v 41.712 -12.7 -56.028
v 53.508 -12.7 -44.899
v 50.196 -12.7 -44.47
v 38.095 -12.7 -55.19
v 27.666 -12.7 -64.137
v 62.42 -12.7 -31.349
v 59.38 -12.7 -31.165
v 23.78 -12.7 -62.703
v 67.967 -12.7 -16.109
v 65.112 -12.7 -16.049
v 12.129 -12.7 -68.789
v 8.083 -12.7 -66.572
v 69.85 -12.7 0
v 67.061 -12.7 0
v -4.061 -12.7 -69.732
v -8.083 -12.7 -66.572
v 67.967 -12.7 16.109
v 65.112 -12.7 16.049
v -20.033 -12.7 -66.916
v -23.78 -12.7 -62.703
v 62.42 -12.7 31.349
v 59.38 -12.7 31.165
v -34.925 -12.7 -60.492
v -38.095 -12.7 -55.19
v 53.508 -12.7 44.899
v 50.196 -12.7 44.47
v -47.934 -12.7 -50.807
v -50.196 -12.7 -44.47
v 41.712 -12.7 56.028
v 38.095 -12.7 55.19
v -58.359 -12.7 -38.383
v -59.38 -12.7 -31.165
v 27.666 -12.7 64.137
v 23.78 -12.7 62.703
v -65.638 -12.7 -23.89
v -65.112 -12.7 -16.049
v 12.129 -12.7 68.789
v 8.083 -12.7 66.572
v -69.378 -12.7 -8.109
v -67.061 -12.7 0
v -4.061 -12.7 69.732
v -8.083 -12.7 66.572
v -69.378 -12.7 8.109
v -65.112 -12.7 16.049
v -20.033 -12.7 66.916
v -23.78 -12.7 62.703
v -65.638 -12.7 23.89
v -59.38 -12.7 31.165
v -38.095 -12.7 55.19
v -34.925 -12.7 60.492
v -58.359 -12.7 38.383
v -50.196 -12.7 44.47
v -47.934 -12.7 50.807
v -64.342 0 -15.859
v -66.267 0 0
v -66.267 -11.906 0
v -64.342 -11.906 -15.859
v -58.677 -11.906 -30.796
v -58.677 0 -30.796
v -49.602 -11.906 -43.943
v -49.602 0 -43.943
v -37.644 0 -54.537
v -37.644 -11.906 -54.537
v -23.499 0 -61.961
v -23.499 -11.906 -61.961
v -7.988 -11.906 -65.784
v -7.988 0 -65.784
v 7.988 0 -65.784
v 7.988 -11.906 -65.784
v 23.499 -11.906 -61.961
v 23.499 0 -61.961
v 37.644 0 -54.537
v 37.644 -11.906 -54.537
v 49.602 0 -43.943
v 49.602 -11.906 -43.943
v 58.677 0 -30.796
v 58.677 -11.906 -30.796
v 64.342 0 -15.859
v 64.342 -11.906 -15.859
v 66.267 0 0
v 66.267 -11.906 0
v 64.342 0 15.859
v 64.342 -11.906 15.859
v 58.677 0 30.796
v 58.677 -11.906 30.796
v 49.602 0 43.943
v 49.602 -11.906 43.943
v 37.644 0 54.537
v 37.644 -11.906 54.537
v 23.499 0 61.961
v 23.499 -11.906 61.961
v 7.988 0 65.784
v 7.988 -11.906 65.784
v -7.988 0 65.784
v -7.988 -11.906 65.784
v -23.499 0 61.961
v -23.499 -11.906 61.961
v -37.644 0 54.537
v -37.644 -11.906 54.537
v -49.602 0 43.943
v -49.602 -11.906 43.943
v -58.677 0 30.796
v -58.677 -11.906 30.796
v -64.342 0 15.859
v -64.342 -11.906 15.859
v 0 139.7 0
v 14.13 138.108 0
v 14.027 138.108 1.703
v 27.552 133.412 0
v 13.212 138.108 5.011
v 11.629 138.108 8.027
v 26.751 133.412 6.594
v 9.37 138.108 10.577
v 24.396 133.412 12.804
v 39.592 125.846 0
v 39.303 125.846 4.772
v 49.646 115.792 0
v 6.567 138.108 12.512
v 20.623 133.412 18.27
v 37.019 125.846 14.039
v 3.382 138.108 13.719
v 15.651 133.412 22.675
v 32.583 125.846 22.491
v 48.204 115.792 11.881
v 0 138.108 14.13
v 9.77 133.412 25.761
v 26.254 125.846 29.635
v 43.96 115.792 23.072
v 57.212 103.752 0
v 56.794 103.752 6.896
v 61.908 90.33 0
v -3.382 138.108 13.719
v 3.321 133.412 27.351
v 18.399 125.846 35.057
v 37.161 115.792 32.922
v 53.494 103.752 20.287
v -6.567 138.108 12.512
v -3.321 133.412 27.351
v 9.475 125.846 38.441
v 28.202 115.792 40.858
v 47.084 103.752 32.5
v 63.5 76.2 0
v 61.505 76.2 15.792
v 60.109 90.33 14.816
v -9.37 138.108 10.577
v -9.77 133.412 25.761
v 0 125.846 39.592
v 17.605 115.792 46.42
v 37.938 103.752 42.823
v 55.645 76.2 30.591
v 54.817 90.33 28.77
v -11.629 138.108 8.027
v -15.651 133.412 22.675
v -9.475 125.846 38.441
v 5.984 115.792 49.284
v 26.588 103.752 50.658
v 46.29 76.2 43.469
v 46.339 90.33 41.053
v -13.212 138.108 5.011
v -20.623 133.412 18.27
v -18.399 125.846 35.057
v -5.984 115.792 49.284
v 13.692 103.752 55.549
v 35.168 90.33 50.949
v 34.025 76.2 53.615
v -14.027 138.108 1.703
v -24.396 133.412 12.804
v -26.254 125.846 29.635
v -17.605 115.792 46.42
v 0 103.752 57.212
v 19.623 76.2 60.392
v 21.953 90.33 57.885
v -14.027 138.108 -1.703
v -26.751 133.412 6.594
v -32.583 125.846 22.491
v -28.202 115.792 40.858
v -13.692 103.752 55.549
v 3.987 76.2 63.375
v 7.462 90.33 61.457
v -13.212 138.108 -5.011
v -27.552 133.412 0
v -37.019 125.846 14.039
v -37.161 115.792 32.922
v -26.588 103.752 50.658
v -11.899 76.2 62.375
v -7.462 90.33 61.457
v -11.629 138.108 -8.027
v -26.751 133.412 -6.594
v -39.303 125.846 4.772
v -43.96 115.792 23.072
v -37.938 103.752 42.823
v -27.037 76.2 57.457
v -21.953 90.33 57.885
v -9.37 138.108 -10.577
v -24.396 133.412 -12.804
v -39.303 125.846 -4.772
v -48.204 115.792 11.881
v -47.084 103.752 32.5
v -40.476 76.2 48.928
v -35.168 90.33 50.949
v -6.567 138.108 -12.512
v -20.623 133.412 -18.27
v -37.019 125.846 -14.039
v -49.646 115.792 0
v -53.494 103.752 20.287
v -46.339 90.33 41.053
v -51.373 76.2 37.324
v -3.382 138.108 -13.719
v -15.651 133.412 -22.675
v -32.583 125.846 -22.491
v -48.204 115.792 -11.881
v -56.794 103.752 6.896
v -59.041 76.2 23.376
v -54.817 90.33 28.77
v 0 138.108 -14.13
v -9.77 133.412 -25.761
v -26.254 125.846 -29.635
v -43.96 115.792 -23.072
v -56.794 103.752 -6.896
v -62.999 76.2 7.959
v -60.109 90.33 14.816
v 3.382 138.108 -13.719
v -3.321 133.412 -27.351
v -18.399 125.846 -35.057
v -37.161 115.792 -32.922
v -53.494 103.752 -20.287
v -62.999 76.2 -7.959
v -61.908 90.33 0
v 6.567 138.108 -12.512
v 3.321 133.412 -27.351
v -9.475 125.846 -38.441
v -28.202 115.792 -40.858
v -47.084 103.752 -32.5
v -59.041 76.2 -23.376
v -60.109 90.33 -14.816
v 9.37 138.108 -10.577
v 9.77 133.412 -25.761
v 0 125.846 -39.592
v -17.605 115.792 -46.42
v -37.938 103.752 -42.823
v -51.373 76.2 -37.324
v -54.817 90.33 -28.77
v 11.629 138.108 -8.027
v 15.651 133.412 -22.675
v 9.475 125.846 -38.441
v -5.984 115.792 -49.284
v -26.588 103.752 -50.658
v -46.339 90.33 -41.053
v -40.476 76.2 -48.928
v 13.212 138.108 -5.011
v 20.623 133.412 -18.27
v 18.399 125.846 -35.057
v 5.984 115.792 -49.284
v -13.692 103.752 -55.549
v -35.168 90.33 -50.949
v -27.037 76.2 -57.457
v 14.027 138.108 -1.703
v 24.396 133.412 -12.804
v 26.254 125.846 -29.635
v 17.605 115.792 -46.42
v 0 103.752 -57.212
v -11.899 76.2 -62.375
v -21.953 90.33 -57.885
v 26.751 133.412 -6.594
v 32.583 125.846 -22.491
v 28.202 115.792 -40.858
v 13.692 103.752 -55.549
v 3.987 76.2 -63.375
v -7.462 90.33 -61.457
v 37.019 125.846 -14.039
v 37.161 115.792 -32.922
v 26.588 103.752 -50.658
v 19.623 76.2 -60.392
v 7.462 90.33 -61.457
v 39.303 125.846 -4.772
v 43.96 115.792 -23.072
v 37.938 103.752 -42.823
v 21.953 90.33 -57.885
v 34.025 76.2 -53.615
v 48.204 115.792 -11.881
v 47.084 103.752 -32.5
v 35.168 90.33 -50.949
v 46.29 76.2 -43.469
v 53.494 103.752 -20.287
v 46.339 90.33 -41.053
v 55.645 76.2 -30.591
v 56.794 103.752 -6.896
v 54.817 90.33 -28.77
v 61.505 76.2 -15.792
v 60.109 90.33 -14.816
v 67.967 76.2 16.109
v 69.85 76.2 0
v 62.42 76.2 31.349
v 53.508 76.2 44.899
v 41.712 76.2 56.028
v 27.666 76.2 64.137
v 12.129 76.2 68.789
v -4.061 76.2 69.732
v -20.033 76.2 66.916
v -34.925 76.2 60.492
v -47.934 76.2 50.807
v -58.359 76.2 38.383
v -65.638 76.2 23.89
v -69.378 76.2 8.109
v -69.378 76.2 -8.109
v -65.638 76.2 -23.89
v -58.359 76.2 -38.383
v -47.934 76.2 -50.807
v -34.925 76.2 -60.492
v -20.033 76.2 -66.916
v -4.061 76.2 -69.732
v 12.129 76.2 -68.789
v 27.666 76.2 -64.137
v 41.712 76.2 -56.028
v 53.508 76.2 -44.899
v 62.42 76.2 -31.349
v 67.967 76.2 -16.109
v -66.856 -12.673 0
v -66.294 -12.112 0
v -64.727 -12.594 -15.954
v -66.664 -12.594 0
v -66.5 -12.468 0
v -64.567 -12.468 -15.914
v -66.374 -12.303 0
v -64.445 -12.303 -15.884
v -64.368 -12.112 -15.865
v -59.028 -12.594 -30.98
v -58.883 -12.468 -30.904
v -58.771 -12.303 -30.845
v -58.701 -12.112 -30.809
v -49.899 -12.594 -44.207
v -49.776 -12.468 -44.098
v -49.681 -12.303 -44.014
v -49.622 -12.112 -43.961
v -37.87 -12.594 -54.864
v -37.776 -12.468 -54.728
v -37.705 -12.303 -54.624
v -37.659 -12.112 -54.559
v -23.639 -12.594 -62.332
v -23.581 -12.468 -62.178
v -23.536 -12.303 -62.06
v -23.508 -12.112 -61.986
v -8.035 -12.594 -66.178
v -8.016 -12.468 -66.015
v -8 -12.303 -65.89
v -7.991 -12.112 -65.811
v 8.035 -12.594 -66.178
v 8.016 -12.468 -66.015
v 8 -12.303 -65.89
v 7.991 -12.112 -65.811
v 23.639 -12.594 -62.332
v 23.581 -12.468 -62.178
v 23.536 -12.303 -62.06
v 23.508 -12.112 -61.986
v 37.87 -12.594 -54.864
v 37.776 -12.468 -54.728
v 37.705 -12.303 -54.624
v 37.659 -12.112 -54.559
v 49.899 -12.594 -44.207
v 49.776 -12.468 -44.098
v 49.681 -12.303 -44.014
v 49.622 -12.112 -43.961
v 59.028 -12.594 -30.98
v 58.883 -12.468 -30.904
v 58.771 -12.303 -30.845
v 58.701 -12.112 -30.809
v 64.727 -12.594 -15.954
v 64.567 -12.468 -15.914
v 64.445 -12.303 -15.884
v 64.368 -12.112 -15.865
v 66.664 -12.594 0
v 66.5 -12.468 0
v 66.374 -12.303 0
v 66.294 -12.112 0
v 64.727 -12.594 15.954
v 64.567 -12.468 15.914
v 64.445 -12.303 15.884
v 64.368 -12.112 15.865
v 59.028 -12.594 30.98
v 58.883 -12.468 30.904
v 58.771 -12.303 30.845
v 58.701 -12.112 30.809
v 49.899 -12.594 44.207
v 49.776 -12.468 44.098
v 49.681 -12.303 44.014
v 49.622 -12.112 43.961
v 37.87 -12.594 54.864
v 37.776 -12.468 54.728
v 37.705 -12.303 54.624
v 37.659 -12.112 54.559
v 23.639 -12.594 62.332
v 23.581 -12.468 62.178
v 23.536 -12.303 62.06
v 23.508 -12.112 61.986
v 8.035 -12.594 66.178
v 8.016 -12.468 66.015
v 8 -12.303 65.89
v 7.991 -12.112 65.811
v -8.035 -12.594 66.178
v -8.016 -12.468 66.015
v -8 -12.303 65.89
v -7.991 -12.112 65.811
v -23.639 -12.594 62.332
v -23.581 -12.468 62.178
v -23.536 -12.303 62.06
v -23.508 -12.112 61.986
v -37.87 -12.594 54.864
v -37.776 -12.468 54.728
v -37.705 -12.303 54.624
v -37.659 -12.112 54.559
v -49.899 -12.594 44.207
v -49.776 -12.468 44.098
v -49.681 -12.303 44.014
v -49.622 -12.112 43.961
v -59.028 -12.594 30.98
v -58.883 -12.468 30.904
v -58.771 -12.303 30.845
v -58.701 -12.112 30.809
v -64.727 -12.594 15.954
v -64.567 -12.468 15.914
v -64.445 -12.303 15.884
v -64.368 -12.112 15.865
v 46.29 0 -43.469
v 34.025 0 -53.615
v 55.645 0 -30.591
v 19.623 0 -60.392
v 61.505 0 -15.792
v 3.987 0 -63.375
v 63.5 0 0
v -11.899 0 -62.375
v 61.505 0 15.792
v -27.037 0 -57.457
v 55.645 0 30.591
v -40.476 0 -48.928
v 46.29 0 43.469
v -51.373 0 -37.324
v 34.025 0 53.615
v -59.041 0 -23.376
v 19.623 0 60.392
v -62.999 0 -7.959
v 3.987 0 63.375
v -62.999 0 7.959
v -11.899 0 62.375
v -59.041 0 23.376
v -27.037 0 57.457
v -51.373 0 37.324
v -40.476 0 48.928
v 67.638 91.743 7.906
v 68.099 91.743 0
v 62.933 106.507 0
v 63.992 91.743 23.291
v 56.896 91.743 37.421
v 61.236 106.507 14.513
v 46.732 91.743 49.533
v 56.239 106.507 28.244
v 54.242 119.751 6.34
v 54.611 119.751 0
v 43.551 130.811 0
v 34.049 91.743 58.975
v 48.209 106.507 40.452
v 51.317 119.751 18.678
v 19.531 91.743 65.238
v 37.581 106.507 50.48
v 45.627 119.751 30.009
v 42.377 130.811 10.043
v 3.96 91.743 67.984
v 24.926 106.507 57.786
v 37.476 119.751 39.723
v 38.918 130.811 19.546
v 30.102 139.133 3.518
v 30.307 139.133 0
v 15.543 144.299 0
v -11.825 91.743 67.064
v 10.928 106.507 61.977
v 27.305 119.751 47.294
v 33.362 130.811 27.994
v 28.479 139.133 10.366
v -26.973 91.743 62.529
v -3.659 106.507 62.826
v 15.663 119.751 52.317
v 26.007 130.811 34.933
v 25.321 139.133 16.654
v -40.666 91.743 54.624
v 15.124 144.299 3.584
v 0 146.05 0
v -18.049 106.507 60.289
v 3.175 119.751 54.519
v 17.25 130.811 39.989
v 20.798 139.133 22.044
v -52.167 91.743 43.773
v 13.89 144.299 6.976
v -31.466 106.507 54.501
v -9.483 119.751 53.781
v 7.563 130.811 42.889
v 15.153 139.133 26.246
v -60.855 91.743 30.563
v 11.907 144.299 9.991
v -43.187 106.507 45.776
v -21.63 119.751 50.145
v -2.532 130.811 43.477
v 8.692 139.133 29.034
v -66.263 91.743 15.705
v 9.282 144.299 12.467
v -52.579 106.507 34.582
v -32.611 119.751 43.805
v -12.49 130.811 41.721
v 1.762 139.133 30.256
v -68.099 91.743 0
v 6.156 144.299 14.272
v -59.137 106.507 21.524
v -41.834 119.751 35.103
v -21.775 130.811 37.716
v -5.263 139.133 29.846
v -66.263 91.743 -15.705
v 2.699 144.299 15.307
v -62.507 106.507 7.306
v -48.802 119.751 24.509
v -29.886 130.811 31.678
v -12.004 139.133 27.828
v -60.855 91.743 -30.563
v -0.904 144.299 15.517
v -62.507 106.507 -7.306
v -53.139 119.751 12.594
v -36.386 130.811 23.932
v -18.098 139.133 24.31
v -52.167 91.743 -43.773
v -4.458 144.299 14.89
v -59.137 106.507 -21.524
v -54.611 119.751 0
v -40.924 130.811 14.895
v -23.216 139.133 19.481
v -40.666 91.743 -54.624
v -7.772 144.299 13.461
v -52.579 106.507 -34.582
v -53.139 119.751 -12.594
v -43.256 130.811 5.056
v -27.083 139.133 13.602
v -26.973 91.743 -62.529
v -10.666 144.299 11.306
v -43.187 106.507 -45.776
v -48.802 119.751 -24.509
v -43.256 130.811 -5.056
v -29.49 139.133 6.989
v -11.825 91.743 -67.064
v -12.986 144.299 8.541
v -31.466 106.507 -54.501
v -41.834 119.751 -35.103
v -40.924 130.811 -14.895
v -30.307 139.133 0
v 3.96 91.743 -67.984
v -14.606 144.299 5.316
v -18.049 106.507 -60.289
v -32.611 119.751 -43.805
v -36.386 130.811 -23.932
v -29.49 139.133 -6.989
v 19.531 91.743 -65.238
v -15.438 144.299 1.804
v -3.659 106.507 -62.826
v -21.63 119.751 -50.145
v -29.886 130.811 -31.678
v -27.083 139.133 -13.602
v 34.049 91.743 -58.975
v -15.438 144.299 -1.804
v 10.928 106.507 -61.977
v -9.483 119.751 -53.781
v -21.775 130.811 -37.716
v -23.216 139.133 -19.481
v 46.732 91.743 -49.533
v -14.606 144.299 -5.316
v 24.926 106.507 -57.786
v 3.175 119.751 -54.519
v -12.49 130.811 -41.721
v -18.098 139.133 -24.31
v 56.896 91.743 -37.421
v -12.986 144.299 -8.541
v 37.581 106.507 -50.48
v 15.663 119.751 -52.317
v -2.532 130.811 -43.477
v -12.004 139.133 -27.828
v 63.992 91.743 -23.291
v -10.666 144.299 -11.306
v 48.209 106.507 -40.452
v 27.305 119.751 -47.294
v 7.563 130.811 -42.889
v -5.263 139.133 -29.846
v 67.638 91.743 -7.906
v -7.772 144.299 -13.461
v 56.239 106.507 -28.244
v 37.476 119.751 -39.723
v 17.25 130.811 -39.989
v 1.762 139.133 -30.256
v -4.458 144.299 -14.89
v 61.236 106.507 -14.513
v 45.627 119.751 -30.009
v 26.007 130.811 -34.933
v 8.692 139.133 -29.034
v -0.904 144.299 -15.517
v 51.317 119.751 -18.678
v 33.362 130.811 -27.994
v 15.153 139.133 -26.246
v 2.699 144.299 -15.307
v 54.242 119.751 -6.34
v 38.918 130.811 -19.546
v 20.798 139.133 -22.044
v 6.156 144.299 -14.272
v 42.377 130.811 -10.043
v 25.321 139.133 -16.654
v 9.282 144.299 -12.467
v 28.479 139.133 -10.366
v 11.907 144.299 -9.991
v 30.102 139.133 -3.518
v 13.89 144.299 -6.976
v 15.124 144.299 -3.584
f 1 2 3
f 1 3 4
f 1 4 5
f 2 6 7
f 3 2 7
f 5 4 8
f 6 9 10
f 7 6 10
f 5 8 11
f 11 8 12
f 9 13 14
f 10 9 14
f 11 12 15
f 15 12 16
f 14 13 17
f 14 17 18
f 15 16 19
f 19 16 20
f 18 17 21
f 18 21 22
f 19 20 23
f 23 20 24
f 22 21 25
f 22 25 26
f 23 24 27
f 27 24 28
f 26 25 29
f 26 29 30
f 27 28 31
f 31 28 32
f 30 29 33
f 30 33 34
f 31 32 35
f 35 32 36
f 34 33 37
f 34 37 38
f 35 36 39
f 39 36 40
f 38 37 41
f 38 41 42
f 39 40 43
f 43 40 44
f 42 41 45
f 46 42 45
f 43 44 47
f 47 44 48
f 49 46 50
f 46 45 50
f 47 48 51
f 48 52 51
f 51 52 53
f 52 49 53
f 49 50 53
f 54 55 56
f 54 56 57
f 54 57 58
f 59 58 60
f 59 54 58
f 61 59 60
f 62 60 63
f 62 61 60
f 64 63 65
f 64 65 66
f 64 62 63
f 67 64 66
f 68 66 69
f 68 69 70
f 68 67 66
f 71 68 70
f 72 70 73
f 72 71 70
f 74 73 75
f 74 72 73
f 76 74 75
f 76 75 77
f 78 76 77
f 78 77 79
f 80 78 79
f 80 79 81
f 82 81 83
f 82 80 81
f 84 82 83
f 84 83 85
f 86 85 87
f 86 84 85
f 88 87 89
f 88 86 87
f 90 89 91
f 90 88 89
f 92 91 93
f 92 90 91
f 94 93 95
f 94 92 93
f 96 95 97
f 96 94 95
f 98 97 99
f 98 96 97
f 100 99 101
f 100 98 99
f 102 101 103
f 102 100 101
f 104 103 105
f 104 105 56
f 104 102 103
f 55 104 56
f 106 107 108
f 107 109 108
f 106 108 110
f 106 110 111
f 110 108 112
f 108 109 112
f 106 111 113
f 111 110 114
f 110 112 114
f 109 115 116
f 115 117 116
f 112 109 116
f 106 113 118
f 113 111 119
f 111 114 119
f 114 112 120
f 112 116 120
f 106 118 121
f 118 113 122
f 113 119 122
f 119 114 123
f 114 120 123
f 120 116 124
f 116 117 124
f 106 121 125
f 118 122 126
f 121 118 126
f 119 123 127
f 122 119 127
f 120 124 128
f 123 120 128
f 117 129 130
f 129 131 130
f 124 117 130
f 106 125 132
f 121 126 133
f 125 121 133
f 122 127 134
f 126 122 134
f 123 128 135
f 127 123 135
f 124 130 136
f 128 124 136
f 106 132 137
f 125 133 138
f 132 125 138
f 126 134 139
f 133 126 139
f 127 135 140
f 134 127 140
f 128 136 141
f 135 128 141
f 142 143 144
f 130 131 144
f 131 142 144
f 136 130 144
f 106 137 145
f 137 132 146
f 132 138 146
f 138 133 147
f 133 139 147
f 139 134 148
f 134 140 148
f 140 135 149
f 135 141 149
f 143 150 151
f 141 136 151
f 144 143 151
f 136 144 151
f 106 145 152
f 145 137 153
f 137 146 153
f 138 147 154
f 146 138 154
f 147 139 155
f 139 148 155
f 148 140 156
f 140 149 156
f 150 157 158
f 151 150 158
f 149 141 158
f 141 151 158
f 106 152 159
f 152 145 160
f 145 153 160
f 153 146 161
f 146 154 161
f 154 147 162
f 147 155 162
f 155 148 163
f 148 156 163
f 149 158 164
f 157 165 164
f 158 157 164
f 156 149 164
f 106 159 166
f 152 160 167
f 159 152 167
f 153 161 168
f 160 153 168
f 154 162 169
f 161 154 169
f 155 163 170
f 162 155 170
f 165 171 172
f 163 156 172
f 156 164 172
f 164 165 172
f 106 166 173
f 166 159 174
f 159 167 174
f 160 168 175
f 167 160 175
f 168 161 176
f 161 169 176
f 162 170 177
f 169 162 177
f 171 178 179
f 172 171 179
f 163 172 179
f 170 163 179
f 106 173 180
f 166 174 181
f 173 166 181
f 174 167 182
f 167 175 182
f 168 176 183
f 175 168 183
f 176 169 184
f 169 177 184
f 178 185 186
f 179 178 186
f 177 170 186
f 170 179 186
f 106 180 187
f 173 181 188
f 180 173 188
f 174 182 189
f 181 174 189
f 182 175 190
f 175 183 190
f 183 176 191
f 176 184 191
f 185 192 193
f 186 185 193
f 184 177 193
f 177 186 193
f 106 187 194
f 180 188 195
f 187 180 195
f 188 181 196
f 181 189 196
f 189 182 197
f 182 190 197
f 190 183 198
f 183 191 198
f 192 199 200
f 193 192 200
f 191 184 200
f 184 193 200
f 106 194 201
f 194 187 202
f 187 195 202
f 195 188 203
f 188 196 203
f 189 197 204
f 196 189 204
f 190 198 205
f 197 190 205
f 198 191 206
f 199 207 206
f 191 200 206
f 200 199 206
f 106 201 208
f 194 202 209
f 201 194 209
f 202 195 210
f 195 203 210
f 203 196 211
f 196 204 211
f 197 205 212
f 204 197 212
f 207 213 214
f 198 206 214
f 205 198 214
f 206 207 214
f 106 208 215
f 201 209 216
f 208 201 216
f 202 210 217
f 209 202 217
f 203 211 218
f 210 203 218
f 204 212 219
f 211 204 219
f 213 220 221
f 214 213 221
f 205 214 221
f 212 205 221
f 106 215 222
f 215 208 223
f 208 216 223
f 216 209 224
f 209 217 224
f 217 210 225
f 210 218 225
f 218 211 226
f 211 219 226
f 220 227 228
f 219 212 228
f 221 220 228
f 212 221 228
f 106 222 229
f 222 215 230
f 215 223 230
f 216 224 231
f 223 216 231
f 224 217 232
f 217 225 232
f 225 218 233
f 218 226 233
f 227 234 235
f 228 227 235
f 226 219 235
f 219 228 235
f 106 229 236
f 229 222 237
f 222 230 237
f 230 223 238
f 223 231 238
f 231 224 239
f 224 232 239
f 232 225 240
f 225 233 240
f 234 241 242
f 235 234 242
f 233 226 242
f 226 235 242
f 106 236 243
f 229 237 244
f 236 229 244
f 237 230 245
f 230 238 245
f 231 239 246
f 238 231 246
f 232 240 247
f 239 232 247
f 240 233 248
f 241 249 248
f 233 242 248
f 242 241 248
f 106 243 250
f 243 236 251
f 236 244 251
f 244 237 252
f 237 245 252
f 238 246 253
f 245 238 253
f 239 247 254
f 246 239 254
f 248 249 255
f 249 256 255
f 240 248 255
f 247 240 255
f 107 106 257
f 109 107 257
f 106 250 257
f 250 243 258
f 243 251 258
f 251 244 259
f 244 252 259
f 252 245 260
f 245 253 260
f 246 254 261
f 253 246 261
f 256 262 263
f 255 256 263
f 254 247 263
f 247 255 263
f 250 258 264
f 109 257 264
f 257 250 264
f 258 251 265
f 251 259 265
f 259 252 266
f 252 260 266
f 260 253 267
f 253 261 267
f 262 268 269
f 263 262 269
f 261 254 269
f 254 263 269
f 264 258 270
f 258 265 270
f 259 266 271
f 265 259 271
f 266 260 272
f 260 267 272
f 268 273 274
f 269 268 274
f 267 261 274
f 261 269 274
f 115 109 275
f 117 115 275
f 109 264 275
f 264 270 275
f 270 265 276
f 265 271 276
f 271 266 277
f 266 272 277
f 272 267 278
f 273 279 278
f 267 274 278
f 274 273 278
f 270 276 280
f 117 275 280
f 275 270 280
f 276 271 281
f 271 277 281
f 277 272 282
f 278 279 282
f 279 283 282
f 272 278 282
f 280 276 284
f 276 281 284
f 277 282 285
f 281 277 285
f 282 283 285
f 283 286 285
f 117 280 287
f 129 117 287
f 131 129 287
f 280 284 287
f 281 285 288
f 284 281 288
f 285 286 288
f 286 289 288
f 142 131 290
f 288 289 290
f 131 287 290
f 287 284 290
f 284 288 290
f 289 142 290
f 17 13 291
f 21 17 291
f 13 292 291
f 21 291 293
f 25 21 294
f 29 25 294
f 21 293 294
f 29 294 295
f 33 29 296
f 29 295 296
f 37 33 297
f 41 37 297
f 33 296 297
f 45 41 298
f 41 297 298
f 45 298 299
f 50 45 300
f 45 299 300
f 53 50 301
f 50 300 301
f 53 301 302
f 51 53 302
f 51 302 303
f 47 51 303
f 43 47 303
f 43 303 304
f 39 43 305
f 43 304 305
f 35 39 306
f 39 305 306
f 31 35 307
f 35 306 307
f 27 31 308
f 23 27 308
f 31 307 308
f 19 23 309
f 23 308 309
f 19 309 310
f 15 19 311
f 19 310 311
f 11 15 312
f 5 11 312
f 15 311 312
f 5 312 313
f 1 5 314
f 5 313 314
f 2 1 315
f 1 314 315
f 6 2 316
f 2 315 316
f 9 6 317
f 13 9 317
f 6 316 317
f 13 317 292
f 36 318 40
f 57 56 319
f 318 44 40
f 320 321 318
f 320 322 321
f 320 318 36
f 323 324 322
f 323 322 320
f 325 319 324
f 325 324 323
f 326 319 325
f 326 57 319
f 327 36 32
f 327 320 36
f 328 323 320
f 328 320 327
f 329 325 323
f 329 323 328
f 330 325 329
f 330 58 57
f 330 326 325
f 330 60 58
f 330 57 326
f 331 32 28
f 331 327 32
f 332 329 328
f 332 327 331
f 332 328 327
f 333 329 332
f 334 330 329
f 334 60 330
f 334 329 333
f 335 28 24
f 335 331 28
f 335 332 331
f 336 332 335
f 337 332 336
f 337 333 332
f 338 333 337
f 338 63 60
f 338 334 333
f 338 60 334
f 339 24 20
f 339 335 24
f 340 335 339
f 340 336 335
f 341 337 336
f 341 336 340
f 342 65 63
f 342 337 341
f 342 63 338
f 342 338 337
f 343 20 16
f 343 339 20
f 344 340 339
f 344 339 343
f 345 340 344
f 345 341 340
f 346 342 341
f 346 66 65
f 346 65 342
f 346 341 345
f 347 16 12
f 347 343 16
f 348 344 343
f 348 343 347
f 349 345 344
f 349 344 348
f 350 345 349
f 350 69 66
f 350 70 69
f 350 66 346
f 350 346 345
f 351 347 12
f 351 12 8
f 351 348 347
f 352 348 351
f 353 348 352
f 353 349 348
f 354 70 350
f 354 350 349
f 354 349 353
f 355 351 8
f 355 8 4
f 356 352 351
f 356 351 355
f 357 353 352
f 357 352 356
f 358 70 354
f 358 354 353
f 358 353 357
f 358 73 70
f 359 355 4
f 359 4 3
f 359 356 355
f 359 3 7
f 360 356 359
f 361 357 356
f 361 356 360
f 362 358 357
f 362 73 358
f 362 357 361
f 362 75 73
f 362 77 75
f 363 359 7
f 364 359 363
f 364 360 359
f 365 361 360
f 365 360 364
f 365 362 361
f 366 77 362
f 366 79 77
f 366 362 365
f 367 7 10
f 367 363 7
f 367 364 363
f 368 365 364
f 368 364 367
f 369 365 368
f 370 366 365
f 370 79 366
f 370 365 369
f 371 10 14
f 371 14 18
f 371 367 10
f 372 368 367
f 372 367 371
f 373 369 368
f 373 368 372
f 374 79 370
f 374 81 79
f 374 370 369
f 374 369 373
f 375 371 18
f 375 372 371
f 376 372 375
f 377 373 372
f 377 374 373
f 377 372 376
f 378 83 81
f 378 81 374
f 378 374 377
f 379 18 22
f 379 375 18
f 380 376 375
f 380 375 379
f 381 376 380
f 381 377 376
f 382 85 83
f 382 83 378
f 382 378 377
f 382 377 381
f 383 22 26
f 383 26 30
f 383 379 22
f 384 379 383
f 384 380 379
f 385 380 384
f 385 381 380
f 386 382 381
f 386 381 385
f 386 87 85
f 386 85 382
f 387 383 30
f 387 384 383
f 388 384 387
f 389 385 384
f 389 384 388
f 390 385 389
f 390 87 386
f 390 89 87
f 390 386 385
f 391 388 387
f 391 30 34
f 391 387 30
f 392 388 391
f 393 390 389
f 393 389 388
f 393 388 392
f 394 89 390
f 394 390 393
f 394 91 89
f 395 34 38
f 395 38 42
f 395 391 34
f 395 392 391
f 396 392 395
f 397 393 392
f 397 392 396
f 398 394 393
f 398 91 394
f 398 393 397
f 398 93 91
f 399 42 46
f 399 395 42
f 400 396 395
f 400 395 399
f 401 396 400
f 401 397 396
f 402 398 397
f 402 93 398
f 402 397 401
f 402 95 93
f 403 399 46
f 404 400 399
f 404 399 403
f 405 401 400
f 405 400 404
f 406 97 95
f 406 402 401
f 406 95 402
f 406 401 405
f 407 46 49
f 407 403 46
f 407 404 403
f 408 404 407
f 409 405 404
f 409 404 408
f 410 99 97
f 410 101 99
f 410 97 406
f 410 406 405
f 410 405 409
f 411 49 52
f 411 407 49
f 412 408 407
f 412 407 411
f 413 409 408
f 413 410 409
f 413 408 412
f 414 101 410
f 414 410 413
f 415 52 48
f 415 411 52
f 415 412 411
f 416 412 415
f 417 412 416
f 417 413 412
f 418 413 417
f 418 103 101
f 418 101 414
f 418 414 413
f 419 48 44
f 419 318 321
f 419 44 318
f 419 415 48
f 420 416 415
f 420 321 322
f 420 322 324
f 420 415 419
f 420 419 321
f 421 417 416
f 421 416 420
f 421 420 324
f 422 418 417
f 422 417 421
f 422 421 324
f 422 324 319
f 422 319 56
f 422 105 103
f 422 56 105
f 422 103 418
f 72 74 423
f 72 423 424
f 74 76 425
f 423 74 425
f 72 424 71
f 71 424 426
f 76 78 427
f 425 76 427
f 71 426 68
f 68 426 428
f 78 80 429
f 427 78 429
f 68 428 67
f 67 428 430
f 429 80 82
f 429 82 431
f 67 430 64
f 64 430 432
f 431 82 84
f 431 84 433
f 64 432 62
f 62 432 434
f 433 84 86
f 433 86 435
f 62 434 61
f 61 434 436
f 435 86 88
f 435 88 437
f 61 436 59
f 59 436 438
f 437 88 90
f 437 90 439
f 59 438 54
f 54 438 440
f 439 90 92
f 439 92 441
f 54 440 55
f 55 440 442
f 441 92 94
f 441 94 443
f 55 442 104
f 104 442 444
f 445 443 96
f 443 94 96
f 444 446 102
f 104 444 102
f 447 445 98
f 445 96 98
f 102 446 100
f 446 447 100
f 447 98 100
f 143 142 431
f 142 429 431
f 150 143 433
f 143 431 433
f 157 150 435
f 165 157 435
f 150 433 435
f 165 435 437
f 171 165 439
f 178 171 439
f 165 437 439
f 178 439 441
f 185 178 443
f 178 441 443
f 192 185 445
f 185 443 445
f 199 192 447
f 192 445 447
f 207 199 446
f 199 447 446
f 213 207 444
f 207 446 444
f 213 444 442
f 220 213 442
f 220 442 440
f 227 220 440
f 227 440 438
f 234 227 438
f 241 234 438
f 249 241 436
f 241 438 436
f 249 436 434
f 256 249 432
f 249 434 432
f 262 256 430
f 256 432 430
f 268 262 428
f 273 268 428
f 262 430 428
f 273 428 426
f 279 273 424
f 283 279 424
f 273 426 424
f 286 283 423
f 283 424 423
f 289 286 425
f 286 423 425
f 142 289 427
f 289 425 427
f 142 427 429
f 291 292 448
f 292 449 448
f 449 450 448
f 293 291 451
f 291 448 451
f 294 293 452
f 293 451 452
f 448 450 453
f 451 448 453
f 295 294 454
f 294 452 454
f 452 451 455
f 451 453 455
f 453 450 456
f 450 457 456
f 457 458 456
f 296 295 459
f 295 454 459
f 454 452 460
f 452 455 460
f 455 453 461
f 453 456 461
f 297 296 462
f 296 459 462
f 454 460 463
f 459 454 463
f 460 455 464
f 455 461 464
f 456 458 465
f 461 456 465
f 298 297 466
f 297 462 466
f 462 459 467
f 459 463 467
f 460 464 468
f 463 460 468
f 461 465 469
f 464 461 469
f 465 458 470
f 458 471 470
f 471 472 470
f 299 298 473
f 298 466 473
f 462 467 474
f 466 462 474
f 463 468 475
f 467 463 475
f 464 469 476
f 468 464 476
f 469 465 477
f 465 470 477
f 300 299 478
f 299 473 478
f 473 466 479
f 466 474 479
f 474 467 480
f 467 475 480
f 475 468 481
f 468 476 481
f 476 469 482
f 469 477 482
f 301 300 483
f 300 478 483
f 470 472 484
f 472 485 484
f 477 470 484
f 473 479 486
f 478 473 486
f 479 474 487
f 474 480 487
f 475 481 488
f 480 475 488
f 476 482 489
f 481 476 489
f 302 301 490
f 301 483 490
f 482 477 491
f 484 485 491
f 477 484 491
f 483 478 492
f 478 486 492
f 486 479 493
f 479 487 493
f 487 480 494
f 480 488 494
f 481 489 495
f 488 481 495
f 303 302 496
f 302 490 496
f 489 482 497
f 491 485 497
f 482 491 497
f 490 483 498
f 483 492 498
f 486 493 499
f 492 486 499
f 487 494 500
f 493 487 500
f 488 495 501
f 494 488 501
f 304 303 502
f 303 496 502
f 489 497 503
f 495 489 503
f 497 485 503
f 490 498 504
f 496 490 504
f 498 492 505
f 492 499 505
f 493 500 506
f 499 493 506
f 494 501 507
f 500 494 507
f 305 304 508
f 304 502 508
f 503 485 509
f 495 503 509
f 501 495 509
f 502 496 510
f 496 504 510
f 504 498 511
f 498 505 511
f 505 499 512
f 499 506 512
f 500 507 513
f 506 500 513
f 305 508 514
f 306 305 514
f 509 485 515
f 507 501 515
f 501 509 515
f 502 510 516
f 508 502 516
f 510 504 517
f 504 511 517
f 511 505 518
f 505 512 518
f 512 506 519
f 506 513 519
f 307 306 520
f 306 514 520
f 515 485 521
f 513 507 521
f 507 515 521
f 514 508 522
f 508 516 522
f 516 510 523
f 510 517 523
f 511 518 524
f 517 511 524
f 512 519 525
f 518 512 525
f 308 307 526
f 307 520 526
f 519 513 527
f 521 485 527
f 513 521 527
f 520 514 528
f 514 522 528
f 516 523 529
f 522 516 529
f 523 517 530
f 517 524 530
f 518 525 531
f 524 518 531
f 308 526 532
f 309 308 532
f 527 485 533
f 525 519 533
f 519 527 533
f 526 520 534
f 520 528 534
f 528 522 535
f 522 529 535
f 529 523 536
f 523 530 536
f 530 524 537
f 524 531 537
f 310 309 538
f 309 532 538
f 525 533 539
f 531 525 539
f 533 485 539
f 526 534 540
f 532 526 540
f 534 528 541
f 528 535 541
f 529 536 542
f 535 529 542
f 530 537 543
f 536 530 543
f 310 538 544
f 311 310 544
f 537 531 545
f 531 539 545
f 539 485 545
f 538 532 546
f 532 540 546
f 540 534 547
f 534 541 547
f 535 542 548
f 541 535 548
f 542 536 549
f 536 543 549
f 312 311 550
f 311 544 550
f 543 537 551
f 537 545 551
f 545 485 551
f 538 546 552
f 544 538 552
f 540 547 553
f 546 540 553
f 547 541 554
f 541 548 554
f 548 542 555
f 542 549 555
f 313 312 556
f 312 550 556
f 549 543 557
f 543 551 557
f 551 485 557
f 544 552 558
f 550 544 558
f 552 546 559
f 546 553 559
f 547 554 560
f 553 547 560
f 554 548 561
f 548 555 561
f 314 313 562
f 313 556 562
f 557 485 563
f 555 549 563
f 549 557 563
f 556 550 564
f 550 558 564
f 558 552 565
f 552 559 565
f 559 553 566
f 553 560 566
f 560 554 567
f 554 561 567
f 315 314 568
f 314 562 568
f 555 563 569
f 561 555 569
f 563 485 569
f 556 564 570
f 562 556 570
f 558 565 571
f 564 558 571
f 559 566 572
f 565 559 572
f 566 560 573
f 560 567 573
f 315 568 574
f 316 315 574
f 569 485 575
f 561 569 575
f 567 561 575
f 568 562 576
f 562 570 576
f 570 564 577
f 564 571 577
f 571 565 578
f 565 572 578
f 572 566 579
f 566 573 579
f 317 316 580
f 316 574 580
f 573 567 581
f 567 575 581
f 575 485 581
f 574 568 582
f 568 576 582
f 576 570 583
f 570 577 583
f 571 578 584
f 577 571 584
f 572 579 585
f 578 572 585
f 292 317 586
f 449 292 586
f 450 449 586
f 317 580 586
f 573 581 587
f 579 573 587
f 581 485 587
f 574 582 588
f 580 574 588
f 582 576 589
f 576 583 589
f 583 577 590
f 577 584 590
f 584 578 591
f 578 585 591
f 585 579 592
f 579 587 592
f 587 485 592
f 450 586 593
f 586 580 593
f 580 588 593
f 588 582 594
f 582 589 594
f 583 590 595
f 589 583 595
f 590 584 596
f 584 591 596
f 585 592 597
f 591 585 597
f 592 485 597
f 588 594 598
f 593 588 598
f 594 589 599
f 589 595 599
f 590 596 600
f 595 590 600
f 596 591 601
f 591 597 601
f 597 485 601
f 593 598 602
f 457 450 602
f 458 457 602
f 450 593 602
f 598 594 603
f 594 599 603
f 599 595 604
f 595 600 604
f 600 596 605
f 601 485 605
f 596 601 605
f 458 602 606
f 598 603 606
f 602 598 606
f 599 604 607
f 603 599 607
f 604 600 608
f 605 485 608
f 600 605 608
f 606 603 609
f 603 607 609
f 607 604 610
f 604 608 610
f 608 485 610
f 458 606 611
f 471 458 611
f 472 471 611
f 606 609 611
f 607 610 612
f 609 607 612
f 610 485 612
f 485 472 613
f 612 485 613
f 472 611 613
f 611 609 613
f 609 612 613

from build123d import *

# Parameters (mm, degrees)
SKETCH1_W           = 3.175
SKETCH1_H           = 12.7
SKETCH3_R           = 67.061060388
SKETCH3_R_2         = 66.267310388
BOSS_EXTRUDE1_DEPTH = 12.7
FILLET2_R           = 0.79375


with BuildPart() as part:
    # Sketch1 → Revolve3 (revolve)
    with BuildSketch(Plane.XY):
        with BuildLine():
            Line((69.85, 0), (69.85, 76.2))
            ThreePointArc((69.85, 76.2), (49.391408666, 125.591408666), (0, 146.05))
            Line((0, 146.05), (0, 139.7))
            ThreePointArc((0, 139.7), (44.901280605, 121.101280605), (63.5, 76.2))
            Line((63.5, 76.2), (63.5, 0))
            Line((63.5, 0), (69.85, 0))
        make_face()
        with Locations((68.2625, -6.35)):
            Rectangle(SKETCH1_W, SKETCH1_H)
    revolve(axis=Axis((0, 146.05, 0), (0, -1, 0)))

    # Sketch3 → Boss-Extrude1 (add)
    with BuildSketch(Plane(origin=(0, 0, 0), x_dir=(-1, 0, 0), z_dir=(0, -1, 0))):
        Circle(SKETCH3_R)
        Circle(SKETCH3_R_2, mode=Mode.SUBTRACT)
    extrude(amount=BOSS_EXTRUDE1_DEPTH)

    # Fillet2
    fillet2_edges = [part.edges().sort_by_distance(p)[0] for p in [
        (66.267310388, -12.7, 0),
    ]]
    fillet(fillet2_edges, radius=FILLET2_R)


solid = part.part
